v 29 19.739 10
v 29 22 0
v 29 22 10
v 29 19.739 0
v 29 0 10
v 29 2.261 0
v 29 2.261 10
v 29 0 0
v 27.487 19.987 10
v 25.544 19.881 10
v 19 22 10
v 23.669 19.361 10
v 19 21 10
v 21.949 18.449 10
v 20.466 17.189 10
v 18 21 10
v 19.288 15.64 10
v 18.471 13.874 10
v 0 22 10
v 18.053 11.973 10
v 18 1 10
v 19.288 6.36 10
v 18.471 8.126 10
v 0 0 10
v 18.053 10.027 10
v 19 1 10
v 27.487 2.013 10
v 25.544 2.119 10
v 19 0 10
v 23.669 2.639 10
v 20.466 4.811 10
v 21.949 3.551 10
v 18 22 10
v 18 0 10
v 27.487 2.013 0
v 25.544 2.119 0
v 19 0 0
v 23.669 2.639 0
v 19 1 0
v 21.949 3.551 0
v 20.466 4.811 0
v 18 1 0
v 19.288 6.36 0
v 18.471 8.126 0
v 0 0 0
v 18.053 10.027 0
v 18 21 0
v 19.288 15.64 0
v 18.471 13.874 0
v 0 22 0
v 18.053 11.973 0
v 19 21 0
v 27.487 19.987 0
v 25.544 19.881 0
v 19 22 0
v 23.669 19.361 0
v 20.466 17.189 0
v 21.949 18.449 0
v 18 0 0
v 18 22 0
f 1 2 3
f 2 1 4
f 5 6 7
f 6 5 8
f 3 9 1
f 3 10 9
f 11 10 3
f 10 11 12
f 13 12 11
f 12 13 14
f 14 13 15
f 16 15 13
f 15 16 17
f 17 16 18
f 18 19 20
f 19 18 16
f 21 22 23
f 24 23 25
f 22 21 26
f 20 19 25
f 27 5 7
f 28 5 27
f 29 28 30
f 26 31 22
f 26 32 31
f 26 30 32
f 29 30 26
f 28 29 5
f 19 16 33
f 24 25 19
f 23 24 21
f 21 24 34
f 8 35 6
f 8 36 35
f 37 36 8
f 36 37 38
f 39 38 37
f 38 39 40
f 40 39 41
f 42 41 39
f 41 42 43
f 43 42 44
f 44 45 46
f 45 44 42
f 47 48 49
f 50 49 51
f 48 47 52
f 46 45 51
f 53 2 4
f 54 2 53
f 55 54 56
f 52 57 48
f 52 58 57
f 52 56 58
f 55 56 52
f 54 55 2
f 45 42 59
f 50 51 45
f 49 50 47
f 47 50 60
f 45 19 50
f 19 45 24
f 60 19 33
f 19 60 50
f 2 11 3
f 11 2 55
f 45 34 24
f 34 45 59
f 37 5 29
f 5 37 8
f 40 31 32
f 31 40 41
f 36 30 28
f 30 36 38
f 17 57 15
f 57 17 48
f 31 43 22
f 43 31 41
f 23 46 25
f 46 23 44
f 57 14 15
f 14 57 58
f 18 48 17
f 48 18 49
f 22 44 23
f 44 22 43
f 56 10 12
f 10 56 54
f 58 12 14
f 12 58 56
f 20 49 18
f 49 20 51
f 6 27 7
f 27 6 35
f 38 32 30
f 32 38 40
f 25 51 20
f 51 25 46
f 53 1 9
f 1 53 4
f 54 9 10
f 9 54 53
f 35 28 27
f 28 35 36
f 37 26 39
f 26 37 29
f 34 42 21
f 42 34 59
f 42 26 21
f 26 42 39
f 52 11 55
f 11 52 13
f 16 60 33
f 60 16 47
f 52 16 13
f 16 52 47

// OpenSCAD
radius=9;
length_overlap=2;
width_overlap=4;
height=10;
top_offset=1;
heel=1;

difference() {
	cube([3 * radius + length_overlap, 2 * radius + width_overlap, height]);
	translate([3 * radius, radius + (width_overlap / 2), 0]) {cylinder(height, r=radius);}
	translate([2 * radius, 0, 0]) { cube([heel, top_offset, height]);}
	translate([2 * radius, 2 * radius + width_overlap - heel, 0]) { cube([heel, top_offset, height]);}
}
